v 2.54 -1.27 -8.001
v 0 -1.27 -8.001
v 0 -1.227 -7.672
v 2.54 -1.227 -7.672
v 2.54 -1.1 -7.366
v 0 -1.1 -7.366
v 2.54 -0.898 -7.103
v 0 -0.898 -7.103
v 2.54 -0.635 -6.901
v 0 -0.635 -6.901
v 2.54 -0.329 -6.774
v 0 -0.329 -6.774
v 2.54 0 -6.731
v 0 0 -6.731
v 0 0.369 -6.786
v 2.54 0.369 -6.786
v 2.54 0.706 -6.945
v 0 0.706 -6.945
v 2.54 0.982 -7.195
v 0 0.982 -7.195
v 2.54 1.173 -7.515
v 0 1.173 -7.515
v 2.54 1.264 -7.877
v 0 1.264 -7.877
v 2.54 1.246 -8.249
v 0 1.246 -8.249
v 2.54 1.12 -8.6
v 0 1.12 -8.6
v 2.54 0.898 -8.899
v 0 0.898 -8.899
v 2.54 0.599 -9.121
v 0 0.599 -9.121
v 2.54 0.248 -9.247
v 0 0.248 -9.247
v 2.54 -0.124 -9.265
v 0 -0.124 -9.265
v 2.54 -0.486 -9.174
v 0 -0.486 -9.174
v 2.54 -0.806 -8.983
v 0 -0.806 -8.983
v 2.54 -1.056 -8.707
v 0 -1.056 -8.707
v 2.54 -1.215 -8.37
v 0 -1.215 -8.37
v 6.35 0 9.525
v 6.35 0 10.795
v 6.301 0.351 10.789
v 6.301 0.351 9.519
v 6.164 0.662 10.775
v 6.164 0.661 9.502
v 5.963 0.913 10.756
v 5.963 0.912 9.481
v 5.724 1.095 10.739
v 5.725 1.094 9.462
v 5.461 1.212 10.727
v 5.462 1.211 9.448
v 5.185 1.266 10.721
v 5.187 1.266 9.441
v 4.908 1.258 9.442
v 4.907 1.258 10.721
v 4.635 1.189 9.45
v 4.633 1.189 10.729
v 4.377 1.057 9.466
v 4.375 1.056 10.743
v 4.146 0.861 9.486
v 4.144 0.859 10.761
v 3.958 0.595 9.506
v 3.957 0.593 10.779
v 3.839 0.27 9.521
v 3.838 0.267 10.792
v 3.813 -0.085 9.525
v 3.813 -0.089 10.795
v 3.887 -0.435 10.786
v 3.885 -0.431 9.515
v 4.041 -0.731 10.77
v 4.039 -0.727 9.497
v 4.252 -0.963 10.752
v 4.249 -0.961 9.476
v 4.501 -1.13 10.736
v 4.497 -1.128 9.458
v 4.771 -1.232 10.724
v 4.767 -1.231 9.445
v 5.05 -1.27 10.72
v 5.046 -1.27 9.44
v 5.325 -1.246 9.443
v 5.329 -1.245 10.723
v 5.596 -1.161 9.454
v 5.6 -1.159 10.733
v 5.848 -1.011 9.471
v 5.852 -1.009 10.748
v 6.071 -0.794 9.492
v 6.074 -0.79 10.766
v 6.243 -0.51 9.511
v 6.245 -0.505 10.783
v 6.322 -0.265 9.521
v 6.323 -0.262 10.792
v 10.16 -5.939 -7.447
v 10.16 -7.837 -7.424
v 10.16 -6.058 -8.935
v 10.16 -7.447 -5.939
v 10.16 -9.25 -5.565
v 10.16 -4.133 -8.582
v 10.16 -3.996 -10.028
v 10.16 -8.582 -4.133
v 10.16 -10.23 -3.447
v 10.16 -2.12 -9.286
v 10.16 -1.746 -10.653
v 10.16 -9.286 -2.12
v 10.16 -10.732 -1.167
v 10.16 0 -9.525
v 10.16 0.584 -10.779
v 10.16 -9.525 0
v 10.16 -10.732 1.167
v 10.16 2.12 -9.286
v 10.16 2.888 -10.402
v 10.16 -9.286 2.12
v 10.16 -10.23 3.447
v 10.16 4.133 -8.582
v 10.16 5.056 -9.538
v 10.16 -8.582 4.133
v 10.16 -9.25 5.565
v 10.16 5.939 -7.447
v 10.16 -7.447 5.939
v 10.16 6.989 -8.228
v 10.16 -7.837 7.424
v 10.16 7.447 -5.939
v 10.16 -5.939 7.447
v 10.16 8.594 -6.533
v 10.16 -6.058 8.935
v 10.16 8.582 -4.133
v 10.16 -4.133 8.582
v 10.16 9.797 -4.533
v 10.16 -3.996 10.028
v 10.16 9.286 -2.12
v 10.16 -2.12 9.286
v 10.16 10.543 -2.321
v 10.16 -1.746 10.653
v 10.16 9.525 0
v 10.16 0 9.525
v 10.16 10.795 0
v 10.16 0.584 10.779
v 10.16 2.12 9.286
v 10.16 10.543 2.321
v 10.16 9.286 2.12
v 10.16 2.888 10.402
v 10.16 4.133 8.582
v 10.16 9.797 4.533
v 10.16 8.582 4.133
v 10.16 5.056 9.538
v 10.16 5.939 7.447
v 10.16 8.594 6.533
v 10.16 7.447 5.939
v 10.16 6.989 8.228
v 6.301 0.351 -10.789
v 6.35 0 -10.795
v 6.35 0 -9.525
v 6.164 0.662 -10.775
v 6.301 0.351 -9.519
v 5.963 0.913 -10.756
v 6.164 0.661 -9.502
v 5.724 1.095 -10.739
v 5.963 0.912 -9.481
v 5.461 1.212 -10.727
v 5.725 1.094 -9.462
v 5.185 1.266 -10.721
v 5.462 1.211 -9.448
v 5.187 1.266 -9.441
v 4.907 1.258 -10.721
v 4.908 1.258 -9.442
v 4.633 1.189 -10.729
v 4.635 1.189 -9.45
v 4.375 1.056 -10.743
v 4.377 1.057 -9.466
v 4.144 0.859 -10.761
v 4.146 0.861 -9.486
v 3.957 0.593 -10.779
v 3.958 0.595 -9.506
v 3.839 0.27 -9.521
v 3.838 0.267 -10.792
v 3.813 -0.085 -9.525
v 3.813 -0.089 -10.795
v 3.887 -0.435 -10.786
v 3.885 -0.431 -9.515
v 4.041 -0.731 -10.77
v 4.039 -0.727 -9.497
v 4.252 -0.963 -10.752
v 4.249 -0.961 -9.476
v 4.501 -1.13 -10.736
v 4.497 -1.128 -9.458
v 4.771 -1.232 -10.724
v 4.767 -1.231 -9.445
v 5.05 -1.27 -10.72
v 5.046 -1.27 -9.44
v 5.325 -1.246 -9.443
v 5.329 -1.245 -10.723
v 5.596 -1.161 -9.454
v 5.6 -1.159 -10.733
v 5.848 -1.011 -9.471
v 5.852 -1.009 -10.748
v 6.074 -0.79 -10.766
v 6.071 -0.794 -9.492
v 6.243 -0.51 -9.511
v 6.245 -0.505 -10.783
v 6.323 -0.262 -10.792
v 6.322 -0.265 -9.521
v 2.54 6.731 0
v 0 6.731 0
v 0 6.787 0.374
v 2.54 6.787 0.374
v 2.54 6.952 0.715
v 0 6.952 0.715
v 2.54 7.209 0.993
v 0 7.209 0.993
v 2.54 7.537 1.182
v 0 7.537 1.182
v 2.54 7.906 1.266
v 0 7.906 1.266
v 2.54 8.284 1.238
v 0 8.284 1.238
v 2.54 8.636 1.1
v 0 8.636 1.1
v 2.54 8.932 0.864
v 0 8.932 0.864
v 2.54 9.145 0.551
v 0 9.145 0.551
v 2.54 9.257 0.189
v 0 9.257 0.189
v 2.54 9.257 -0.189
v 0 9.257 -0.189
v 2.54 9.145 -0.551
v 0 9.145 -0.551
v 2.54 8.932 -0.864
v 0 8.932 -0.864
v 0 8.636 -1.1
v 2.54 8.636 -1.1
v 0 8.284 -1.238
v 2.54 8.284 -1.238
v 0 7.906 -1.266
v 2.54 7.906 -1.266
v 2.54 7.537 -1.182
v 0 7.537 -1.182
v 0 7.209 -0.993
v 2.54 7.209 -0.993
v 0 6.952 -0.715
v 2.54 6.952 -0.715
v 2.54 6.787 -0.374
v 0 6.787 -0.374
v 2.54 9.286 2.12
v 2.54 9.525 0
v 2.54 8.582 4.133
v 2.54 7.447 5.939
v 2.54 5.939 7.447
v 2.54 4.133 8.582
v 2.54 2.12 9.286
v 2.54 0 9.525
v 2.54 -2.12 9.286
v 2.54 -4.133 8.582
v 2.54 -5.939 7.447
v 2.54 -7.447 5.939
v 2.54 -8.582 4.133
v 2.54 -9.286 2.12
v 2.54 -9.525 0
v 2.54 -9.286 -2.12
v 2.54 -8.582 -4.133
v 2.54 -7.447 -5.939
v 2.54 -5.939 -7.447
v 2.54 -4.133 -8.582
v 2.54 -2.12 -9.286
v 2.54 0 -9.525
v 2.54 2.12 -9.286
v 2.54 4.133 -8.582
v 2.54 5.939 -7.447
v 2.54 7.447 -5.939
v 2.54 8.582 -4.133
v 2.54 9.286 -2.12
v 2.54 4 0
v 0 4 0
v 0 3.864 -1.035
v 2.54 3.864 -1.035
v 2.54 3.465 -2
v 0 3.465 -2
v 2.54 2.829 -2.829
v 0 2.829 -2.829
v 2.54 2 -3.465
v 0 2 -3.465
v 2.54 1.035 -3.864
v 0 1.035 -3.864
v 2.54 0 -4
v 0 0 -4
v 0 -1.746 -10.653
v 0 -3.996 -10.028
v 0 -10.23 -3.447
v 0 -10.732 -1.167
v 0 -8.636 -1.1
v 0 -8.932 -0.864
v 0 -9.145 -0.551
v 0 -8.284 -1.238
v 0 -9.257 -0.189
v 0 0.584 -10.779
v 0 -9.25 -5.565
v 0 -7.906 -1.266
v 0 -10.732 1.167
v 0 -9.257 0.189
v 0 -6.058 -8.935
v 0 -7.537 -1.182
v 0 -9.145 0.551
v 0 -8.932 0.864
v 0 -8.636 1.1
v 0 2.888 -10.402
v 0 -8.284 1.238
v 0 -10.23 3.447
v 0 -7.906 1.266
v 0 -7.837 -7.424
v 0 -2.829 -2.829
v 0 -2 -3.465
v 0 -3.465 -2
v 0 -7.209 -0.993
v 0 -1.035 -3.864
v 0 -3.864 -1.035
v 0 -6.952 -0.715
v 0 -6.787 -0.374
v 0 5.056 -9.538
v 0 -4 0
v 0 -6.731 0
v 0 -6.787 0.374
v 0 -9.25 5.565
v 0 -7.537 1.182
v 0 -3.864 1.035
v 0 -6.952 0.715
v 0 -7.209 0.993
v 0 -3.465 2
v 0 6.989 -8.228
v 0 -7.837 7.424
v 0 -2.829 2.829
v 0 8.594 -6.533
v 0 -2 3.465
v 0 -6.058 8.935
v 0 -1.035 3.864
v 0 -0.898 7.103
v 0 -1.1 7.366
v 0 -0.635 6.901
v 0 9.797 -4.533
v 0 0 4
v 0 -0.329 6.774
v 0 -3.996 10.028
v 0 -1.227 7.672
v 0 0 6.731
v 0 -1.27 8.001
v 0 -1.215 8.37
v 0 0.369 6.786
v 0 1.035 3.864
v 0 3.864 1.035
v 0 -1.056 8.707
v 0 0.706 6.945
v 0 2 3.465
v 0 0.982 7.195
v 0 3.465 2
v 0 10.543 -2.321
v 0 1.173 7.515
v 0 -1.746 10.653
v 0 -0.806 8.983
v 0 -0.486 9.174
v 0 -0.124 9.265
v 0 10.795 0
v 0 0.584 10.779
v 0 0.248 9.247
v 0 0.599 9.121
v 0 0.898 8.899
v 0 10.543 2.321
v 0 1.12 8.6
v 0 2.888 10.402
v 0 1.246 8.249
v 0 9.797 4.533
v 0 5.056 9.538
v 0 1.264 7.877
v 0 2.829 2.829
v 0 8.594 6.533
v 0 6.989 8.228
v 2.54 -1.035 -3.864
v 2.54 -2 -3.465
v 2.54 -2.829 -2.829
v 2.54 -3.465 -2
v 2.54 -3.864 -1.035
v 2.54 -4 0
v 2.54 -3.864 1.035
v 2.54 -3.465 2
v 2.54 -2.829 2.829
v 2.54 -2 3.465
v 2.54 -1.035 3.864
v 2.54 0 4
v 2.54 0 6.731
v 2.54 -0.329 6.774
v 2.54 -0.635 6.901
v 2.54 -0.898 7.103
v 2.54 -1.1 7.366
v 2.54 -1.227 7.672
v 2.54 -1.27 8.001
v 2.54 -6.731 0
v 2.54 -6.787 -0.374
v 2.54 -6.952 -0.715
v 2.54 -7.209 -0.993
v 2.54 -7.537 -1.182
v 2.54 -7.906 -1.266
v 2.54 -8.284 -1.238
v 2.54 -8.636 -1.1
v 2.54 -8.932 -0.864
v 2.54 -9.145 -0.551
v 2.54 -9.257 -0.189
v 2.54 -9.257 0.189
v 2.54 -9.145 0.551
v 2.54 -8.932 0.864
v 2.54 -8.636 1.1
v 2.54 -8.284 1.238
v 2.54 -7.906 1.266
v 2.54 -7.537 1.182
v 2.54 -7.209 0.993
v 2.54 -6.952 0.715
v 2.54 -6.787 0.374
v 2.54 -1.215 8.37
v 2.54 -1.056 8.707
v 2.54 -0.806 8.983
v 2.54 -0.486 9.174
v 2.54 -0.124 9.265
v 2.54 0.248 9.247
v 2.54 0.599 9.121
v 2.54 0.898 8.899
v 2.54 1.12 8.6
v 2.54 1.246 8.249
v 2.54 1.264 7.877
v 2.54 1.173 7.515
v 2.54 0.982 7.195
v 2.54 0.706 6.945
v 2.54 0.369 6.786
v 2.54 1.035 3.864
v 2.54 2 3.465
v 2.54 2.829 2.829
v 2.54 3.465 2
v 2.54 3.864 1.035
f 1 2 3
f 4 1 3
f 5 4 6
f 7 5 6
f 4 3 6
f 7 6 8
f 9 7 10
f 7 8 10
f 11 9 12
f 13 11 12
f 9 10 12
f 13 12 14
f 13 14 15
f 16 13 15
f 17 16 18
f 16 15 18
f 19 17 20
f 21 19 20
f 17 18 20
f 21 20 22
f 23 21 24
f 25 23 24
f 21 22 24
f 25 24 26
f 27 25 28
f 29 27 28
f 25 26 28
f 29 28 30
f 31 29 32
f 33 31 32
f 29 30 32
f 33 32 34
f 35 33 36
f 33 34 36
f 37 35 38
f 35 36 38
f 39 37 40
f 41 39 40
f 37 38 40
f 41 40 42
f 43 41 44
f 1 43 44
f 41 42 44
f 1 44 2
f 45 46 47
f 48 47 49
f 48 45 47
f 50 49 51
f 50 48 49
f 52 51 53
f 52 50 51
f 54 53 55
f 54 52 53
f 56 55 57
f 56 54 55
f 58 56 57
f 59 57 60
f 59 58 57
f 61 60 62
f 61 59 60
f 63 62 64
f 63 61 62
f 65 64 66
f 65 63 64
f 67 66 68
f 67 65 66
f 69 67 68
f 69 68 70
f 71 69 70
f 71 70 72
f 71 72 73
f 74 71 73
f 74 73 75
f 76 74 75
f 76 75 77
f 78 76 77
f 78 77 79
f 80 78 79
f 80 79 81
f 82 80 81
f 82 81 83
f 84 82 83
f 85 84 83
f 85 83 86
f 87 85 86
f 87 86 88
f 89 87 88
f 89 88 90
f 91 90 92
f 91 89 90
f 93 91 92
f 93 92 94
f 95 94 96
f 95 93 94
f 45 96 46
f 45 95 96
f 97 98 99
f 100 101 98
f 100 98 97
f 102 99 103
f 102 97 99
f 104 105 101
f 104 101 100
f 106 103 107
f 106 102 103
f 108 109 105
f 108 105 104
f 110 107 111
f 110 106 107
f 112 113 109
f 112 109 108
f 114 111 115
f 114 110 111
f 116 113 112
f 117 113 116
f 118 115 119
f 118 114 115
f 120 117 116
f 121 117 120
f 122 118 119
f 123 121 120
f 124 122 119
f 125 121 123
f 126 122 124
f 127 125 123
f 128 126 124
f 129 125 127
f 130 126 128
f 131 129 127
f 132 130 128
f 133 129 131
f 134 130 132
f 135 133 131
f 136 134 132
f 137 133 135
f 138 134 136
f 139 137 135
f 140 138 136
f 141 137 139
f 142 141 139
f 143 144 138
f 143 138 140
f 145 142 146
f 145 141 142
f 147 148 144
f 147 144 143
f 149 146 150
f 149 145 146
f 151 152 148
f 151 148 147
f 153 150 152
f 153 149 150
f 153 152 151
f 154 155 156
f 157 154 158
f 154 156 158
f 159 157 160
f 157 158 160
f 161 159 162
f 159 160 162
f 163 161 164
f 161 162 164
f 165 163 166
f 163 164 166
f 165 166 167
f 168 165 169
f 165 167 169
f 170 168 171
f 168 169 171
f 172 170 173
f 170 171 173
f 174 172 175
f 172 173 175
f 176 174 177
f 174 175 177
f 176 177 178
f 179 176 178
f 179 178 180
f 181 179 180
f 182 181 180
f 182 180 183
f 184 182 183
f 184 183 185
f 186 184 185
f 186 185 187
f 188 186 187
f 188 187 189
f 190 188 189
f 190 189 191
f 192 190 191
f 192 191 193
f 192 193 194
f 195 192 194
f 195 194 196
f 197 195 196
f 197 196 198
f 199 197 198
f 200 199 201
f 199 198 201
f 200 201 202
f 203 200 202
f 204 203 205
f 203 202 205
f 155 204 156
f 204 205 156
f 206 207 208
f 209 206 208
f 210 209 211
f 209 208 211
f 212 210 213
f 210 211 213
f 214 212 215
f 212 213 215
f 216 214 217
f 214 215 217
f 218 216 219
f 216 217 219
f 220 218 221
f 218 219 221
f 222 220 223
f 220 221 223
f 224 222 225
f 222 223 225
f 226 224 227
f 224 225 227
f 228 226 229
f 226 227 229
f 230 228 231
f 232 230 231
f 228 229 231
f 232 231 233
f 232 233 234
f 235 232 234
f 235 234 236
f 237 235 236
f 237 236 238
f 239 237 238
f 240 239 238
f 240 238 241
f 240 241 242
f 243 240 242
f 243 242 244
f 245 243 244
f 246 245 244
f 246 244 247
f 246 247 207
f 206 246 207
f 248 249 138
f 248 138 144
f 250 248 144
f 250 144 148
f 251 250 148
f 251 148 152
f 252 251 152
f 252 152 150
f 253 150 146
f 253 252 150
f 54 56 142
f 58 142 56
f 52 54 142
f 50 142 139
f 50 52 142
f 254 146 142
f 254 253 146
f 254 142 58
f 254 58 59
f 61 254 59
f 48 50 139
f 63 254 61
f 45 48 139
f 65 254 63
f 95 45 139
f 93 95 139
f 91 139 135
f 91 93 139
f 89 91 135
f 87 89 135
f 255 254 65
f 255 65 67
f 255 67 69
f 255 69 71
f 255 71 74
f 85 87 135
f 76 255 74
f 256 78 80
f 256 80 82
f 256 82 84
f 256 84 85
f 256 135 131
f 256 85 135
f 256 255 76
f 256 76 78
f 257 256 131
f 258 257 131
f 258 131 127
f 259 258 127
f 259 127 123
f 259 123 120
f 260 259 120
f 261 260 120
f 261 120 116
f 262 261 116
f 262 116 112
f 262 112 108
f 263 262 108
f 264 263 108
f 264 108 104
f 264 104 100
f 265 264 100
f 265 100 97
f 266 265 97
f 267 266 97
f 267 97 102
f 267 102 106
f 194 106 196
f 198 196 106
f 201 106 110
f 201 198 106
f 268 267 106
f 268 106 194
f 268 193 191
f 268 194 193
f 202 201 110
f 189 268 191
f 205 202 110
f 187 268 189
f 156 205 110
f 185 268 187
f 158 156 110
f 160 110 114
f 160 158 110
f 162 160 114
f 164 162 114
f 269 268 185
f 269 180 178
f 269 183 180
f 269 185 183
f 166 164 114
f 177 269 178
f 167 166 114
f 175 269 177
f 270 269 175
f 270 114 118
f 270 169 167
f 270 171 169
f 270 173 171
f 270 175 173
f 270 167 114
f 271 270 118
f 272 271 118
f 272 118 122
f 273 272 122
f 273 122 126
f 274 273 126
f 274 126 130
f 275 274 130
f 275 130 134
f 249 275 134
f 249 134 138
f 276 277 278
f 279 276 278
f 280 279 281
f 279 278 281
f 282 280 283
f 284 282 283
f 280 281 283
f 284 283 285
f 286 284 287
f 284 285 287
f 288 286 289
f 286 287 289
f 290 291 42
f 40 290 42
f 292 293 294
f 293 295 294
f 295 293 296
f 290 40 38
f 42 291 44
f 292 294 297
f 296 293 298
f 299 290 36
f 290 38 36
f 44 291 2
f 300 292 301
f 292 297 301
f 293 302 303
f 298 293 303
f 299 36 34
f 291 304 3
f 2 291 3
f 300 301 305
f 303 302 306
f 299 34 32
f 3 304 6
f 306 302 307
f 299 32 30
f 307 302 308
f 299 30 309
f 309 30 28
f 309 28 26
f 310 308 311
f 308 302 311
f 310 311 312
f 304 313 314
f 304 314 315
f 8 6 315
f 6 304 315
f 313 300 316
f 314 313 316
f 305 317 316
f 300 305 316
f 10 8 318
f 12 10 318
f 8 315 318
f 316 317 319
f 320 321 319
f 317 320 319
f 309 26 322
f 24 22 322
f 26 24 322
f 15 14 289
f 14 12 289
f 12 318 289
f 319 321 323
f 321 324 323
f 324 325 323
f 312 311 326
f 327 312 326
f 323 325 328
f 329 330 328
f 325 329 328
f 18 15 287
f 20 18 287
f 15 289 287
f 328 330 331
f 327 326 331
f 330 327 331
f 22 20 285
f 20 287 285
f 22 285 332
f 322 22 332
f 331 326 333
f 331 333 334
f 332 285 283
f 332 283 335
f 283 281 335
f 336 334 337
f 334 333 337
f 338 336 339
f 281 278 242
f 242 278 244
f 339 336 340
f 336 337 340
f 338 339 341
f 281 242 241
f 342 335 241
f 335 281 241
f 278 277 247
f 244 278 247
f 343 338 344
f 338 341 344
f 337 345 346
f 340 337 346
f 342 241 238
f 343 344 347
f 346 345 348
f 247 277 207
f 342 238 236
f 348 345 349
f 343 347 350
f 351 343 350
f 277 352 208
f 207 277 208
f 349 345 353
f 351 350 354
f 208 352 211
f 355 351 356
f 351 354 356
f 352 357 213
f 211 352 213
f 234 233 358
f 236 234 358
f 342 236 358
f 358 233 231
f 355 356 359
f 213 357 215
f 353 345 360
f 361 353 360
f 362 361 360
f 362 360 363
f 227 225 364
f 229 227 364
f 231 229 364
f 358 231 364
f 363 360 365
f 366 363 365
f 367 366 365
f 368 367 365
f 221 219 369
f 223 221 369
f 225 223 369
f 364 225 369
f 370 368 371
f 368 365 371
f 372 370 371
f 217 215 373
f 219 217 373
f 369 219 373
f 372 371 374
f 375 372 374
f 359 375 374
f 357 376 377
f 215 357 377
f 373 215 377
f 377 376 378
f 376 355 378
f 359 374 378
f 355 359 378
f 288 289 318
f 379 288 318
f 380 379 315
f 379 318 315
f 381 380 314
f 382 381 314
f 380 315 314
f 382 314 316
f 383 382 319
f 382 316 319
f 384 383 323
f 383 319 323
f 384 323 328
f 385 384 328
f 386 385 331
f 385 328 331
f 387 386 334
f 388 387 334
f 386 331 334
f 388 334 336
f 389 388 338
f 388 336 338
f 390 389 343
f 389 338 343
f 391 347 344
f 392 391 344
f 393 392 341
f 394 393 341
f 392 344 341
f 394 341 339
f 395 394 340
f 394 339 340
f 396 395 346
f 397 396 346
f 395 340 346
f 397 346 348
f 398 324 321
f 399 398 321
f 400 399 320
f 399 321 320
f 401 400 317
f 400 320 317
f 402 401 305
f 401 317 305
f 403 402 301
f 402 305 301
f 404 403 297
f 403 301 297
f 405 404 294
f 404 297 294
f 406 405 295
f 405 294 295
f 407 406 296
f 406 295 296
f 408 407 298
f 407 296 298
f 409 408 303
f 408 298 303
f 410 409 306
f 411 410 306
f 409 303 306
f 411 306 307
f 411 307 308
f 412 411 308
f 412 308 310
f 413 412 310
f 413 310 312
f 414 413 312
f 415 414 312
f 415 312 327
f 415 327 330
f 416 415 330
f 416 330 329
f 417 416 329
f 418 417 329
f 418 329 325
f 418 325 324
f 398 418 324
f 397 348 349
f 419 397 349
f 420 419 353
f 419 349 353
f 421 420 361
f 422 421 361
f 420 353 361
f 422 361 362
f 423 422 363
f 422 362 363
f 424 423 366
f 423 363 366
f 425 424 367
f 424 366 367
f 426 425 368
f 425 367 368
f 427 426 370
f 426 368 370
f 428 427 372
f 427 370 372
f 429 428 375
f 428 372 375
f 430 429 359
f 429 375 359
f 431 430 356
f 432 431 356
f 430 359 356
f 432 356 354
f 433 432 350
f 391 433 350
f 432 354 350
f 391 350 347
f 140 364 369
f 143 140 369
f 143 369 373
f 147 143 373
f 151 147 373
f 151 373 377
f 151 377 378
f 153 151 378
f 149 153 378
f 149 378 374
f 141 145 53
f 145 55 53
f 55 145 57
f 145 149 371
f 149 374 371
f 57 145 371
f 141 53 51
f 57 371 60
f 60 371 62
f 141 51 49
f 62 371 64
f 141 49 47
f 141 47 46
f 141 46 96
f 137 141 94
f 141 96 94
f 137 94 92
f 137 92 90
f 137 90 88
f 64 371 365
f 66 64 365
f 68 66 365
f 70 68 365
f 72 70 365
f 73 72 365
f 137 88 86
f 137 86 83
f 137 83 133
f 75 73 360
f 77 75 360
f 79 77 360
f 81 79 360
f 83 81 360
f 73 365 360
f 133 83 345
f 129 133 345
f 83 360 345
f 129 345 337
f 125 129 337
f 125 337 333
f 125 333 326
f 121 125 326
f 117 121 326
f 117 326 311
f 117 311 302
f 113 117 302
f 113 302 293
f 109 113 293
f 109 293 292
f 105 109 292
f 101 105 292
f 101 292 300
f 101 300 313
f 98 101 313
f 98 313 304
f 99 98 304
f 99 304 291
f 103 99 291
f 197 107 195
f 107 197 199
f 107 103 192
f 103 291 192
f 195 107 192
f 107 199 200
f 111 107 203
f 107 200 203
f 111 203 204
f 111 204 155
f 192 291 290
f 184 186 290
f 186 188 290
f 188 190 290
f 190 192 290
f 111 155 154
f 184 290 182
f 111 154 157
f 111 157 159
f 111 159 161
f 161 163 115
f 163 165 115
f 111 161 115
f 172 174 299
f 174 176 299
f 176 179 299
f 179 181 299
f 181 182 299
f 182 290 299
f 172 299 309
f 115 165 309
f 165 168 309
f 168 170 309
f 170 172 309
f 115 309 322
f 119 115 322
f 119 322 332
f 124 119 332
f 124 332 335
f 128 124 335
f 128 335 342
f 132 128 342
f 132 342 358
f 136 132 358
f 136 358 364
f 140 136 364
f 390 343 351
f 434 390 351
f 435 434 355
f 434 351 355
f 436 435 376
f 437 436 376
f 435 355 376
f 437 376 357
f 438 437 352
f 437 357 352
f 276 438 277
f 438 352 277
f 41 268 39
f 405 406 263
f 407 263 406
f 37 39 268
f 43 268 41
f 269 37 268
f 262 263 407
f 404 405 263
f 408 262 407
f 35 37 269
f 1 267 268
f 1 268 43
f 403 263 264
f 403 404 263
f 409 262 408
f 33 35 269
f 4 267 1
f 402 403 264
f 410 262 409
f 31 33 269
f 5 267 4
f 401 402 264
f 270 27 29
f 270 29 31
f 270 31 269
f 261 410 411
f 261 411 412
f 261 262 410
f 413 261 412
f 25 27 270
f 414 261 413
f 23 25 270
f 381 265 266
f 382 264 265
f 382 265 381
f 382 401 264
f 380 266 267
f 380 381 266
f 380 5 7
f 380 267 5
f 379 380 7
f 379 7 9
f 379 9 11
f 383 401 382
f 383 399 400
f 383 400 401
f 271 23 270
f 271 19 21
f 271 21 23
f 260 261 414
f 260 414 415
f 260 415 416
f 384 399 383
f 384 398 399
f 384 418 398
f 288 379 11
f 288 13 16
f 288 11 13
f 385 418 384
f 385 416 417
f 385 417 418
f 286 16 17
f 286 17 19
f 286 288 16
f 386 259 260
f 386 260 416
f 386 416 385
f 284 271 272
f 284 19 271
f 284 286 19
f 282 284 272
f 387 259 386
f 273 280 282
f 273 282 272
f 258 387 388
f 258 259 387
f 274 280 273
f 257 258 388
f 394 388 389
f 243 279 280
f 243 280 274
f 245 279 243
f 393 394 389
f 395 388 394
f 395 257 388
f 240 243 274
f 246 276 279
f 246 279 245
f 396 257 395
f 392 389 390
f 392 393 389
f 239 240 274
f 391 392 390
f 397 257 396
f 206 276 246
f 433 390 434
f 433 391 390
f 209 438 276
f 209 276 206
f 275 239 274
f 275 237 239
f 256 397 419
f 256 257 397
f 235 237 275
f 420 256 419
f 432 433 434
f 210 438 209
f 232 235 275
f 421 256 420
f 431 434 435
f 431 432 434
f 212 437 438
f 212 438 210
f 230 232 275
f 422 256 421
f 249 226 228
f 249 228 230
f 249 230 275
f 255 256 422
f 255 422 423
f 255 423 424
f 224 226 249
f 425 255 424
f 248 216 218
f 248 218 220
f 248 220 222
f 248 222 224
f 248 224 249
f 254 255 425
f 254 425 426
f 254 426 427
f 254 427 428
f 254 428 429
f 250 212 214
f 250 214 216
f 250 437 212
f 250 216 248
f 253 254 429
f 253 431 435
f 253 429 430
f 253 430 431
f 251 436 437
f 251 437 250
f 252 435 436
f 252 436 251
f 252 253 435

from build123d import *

# Parameters (mm, degrees)
F0_R     = 10.795
F0_R_2   = 9.525
F1_DEPTH = 10.16
F2_DEPTH = 2.54
F4_DEPTH = 25.4
F5_DEPTH = 25.4
F6_R     = 1.27
F7_DEPTH = 25.4


with BuildPart() as f1:
    # F0 (on Right) → F1 (new body)
    with BuildSketch(Plane.YZ):
        Circle(F0_R)
        Circle(F0_R_2, mode=Mode.SUBTRACT)
    extrude(amount=F1_DEPTH)

    # F0 (on Right) → F2 (join)
    with BuildSketch(Plane.YZ):
        Circle(F0_R_2)
    extrude(amount=F2_DEPTH)

    # F3 (on Top) → F4 (cut)
    with BuildSketch(Plane.XY):
        with BuildLine():
            ThreePointArc((3.81, 0), (5.08, -1.27), (6.35, 0))
            ThreePointArc((6.35, 0), (5.08, 1.27), (3.81, 0))
        make_face()
    extrude(amount=-F4_DEPTH, mode=Mode.SUBTRACT)

    # F3 (on Top) → F5 (cut)
    with BuildSketch(Plane.XY):
        with BuildLine():
            ThreePointArc((3.81, 0), (5.08, -1.27), (6.35, 0))
            ThreePointArc((6.35, 0), (5.08, 1.27), (3.81, 0))
        make_face()
    extrude(amount=F5_DEPTH, mode=Mode.SUBTRACT)

    # F6 (on face) → F7 (cut)
    with BuildSketch(Plane(origin=(0, 0, 0), x_dir=(0, -1, 0), z_dir=(-1, 0, 0))):
        with BuildLine():
            ThreePointArc((1.27, 8.001), (-0.8980256121, 8.8990256121), (0, 6.731))
            ThreePointArc((0, 6.731), (0.8980256121, 7.1029743879), (1.27, 8.001))
        make_face()
        with Locations((-8.001, 0)):
            Circle(F6_R)
        with BuildLine():
            ThreePointArc((1.27, -8.001), (0.8980256121, -7.1029743879), (0, -6.731))
            ThreePointArc((0, -6.731), (-0.8980256121, -8.8990256121), (1.27, -8.001))
        make_face()
        with BuildLine():
            ThreePointArc((9.271, 0), (8.001, 1.27), (6.731, 0))
            ThreePointArc((6.731, 0), (8.001, -1.27), (9.271, 0))
        make_face()
        with BuildLine():
            Line((0, 0), (4.0005, 0))
            ThreePointArc((4.0005, 0), (2.8287806781, 2.8287806781), (0, 4.0005))
            Line((0, 4.0005), (0, 0))
        make_face()
        with BuildLine():
            Line((0, 0), (0, 4.0005))
            ThreePointArc((0, 4.0005), (-2.8287806781, 2.8287806781), (-4.0005, 0))
            Line((-4.0005, 0), (0, 0))
        make_face()
        with BuildLine():
            ThreePointArc((-4.0005, 0), (-2.8287806781, -2.8287806781), (0, -4.0005))
            Line((0, -4.0005), (0, 0))
            Line((0, 0), (-4.0005, 0))
        make_face()
        with BuildLine():
            ThreePointArc((0, -4.0005), (2.8287806781, -2.8287806781), (4.0005, 0))
            Line((4.0005, 0), (0, 0))
            Line((0, 0), (0, -4.0005))
        make_face()
    extrude(amount=-F7_DEPTH, mode=Mode.SUBTRACT)


solid = f1.part
